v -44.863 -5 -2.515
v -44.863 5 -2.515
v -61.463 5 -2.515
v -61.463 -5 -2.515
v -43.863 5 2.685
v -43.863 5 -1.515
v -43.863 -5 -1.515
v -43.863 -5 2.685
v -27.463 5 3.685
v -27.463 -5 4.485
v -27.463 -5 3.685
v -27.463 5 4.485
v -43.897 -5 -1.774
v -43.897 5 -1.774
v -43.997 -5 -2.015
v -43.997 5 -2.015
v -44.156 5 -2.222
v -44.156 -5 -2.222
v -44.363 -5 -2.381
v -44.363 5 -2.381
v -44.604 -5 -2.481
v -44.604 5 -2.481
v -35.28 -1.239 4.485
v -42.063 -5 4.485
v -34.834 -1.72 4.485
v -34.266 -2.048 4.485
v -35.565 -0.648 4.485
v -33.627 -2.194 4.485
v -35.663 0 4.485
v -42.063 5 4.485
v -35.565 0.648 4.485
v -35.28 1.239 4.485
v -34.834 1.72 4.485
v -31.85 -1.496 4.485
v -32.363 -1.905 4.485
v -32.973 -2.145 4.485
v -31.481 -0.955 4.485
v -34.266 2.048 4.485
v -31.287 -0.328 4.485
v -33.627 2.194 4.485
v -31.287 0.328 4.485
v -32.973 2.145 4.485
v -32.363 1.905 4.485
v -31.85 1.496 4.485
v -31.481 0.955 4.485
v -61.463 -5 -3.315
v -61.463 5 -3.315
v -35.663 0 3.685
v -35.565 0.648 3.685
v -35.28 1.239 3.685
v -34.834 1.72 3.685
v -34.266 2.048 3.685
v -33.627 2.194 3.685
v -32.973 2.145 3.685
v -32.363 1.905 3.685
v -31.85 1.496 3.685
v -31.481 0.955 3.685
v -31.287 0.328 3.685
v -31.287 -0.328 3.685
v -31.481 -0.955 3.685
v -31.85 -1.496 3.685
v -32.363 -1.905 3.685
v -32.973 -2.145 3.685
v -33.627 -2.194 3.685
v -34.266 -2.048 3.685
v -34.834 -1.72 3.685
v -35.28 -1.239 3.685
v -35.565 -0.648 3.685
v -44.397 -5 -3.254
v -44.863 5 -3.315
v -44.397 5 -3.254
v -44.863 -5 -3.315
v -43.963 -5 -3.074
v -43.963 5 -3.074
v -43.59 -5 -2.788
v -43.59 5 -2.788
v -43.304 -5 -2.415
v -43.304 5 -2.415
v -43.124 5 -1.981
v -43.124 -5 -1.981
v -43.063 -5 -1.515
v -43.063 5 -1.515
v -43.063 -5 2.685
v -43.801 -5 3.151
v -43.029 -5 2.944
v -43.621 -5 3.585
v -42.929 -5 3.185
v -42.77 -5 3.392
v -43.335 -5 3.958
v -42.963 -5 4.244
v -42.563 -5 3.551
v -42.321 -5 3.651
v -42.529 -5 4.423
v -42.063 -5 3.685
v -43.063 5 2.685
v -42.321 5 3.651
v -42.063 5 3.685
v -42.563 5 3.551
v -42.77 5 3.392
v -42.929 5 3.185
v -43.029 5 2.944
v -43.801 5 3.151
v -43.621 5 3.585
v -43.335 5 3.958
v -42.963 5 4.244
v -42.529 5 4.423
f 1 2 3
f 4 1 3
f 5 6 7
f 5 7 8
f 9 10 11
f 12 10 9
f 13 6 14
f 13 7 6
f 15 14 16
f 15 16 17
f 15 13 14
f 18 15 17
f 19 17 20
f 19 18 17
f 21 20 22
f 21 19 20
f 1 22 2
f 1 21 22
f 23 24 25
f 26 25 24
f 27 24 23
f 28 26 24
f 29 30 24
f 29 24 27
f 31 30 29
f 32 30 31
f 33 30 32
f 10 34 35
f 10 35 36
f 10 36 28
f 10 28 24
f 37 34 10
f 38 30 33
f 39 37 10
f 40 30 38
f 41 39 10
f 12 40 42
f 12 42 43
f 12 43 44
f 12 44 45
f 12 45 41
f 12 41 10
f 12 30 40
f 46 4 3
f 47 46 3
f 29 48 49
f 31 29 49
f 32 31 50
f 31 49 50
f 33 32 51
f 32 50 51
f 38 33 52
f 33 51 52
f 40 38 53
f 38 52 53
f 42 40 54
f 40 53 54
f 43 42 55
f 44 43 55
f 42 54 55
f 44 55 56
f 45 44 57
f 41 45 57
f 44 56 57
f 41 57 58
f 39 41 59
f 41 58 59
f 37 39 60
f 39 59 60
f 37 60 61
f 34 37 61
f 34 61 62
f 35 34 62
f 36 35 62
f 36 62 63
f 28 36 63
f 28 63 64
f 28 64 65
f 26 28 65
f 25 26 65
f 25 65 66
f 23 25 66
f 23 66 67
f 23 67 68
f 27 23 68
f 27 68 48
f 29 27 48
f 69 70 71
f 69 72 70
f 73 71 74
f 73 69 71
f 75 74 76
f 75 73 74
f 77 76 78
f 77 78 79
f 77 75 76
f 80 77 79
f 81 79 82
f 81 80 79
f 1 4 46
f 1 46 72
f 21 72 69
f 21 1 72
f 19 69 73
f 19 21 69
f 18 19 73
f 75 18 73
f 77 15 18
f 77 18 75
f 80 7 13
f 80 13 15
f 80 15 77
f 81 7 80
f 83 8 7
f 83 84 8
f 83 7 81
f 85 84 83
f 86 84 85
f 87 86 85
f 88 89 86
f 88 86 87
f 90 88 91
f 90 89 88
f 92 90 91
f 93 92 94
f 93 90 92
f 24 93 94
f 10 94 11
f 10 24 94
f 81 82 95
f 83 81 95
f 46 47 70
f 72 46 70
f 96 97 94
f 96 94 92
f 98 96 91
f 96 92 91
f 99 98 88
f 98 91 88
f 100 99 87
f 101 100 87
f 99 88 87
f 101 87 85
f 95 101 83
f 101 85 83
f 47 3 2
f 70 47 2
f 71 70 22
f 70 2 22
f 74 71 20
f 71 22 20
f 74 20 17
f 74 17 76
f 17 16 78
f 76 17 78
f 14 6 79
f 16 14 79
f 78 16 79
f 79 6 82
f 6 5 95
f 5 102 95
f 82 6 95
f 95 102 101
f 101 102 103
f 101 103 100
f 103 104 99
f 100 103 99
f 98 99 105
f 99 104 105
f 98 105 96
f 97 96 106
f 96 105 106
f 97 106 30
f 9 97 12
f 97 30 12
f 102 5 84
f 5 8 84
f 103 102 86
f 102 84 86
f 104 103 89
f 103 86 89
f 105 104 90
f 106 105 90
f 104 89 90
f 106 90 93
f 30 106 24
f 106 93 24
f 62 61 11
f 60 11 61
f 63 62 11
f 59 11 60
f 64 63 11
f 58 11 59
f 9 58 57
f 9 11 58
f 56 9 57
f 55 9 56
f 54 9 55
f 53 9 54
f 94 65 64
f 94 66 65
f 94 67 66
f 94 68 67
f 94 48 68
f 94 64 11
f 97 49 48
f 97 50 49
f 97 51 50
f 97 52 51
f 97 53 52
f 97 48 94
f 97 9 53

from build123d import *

# Parameters (mm, degrees)
SKETCH1_W           = 34
SKETCH1_H           = 10
BOSS_EXTRUDE1_DEPTH = 7.8
SKETCH2_W           = 15.6
SKETCH2_H           = 7
CUT_EXTRUDE1_DEPTH  = 63.432123894
SKETCH3_W           = 17.6
SKETCH3_H           = 7
CUT_EXTRUDE2_DEPTH  = 63.432123894
HOLE1_D             = 4.4
HOLE1_DEPTH         = 7.8
FILLET1_R           = 1
FILLET2_R           = 1
FILLET3_R           = 1.8
FILLET4_R           = 1.8


with BuildPart() as part:
    # Sketch1 → Boss-Extrude1 (new body)
    with BuildSketch(Plane.XY.offset(4.484761641)):
        with Locations((-44.46264725, 0)):
            Rectangle(SKETCH1_W, SKETCH1_H)
    extrude(amount=-BOSS_EXTRUDE1_DEPTH)

    # Sketch2 → Cut-Extrude1 (cut, through all)
    with BuildSketch(Plane(origin=(0, 5, 0), x_dir=(-1, 0, 0), z_dir=(0, 1, 0))):
        with Locations((35.26264725, 0.184761641)):
            Rectangle(SKETCH2_W, SKETCH2_H)
    extrude(amount=-CUT_EXTRUDE1_DEPTH, mode=Mode.SUBTRACT)

    # Sketch3 → Cut-Extrude2 (cut, through all)
    with BuildSketch(Plane(origin=(0, 5, 0), x_dir=(-1, 0, 0), z_dir=(0, 1, 0))):
        with Locations((52.66264725, 0.984761641)):
            Rectangle(SKETCH3_W, SKETCH3_H)
    extrude(amount=-CUT_EXTRUDE2_DEPTH, mode=Mode.SUBTRACT)

    # Hole1
    with Locations(Plane.XY.offset(4.484761641)):
        with Locations((-33.46264725, 0)):
            Hole(HOLE1_D / 2, depth=HOLE1_DEPTH)

    # Fillet1
    fillet1_edges = [part.edges().sort_by_distance(p)[0] for p in [
        (-43.06264725, 0, 3.684761641),
    ]]
    fillet(fillet1_edges, radius=FILLET1_R)

    # Fillet2
    fillet2_edges = [part.edges().sort_by_distance(p)[0] for p in [
        (-43.86264725, 0, -2.515238359),
    ]]
    fillet(fillet2_edges, radius=FILLET2_R)

    # Fillet3
    fillet3_edges = [part.edges().sort_by_distance(p)[0] for p in [
        (-43.06264725, 0, -3.315238359),
    ]]
    fillet(fillet3_edges, radius=FILLET3_R)

    # Fillet4
    fillet4_edges = [part.edges().sort_by_distance(p)[0] for p in [
        (-43.86264725, 0, 4.484761641),
    ]]
    fillet(fillet4_edges, radius=FILLET4_R)


solid = part.part
